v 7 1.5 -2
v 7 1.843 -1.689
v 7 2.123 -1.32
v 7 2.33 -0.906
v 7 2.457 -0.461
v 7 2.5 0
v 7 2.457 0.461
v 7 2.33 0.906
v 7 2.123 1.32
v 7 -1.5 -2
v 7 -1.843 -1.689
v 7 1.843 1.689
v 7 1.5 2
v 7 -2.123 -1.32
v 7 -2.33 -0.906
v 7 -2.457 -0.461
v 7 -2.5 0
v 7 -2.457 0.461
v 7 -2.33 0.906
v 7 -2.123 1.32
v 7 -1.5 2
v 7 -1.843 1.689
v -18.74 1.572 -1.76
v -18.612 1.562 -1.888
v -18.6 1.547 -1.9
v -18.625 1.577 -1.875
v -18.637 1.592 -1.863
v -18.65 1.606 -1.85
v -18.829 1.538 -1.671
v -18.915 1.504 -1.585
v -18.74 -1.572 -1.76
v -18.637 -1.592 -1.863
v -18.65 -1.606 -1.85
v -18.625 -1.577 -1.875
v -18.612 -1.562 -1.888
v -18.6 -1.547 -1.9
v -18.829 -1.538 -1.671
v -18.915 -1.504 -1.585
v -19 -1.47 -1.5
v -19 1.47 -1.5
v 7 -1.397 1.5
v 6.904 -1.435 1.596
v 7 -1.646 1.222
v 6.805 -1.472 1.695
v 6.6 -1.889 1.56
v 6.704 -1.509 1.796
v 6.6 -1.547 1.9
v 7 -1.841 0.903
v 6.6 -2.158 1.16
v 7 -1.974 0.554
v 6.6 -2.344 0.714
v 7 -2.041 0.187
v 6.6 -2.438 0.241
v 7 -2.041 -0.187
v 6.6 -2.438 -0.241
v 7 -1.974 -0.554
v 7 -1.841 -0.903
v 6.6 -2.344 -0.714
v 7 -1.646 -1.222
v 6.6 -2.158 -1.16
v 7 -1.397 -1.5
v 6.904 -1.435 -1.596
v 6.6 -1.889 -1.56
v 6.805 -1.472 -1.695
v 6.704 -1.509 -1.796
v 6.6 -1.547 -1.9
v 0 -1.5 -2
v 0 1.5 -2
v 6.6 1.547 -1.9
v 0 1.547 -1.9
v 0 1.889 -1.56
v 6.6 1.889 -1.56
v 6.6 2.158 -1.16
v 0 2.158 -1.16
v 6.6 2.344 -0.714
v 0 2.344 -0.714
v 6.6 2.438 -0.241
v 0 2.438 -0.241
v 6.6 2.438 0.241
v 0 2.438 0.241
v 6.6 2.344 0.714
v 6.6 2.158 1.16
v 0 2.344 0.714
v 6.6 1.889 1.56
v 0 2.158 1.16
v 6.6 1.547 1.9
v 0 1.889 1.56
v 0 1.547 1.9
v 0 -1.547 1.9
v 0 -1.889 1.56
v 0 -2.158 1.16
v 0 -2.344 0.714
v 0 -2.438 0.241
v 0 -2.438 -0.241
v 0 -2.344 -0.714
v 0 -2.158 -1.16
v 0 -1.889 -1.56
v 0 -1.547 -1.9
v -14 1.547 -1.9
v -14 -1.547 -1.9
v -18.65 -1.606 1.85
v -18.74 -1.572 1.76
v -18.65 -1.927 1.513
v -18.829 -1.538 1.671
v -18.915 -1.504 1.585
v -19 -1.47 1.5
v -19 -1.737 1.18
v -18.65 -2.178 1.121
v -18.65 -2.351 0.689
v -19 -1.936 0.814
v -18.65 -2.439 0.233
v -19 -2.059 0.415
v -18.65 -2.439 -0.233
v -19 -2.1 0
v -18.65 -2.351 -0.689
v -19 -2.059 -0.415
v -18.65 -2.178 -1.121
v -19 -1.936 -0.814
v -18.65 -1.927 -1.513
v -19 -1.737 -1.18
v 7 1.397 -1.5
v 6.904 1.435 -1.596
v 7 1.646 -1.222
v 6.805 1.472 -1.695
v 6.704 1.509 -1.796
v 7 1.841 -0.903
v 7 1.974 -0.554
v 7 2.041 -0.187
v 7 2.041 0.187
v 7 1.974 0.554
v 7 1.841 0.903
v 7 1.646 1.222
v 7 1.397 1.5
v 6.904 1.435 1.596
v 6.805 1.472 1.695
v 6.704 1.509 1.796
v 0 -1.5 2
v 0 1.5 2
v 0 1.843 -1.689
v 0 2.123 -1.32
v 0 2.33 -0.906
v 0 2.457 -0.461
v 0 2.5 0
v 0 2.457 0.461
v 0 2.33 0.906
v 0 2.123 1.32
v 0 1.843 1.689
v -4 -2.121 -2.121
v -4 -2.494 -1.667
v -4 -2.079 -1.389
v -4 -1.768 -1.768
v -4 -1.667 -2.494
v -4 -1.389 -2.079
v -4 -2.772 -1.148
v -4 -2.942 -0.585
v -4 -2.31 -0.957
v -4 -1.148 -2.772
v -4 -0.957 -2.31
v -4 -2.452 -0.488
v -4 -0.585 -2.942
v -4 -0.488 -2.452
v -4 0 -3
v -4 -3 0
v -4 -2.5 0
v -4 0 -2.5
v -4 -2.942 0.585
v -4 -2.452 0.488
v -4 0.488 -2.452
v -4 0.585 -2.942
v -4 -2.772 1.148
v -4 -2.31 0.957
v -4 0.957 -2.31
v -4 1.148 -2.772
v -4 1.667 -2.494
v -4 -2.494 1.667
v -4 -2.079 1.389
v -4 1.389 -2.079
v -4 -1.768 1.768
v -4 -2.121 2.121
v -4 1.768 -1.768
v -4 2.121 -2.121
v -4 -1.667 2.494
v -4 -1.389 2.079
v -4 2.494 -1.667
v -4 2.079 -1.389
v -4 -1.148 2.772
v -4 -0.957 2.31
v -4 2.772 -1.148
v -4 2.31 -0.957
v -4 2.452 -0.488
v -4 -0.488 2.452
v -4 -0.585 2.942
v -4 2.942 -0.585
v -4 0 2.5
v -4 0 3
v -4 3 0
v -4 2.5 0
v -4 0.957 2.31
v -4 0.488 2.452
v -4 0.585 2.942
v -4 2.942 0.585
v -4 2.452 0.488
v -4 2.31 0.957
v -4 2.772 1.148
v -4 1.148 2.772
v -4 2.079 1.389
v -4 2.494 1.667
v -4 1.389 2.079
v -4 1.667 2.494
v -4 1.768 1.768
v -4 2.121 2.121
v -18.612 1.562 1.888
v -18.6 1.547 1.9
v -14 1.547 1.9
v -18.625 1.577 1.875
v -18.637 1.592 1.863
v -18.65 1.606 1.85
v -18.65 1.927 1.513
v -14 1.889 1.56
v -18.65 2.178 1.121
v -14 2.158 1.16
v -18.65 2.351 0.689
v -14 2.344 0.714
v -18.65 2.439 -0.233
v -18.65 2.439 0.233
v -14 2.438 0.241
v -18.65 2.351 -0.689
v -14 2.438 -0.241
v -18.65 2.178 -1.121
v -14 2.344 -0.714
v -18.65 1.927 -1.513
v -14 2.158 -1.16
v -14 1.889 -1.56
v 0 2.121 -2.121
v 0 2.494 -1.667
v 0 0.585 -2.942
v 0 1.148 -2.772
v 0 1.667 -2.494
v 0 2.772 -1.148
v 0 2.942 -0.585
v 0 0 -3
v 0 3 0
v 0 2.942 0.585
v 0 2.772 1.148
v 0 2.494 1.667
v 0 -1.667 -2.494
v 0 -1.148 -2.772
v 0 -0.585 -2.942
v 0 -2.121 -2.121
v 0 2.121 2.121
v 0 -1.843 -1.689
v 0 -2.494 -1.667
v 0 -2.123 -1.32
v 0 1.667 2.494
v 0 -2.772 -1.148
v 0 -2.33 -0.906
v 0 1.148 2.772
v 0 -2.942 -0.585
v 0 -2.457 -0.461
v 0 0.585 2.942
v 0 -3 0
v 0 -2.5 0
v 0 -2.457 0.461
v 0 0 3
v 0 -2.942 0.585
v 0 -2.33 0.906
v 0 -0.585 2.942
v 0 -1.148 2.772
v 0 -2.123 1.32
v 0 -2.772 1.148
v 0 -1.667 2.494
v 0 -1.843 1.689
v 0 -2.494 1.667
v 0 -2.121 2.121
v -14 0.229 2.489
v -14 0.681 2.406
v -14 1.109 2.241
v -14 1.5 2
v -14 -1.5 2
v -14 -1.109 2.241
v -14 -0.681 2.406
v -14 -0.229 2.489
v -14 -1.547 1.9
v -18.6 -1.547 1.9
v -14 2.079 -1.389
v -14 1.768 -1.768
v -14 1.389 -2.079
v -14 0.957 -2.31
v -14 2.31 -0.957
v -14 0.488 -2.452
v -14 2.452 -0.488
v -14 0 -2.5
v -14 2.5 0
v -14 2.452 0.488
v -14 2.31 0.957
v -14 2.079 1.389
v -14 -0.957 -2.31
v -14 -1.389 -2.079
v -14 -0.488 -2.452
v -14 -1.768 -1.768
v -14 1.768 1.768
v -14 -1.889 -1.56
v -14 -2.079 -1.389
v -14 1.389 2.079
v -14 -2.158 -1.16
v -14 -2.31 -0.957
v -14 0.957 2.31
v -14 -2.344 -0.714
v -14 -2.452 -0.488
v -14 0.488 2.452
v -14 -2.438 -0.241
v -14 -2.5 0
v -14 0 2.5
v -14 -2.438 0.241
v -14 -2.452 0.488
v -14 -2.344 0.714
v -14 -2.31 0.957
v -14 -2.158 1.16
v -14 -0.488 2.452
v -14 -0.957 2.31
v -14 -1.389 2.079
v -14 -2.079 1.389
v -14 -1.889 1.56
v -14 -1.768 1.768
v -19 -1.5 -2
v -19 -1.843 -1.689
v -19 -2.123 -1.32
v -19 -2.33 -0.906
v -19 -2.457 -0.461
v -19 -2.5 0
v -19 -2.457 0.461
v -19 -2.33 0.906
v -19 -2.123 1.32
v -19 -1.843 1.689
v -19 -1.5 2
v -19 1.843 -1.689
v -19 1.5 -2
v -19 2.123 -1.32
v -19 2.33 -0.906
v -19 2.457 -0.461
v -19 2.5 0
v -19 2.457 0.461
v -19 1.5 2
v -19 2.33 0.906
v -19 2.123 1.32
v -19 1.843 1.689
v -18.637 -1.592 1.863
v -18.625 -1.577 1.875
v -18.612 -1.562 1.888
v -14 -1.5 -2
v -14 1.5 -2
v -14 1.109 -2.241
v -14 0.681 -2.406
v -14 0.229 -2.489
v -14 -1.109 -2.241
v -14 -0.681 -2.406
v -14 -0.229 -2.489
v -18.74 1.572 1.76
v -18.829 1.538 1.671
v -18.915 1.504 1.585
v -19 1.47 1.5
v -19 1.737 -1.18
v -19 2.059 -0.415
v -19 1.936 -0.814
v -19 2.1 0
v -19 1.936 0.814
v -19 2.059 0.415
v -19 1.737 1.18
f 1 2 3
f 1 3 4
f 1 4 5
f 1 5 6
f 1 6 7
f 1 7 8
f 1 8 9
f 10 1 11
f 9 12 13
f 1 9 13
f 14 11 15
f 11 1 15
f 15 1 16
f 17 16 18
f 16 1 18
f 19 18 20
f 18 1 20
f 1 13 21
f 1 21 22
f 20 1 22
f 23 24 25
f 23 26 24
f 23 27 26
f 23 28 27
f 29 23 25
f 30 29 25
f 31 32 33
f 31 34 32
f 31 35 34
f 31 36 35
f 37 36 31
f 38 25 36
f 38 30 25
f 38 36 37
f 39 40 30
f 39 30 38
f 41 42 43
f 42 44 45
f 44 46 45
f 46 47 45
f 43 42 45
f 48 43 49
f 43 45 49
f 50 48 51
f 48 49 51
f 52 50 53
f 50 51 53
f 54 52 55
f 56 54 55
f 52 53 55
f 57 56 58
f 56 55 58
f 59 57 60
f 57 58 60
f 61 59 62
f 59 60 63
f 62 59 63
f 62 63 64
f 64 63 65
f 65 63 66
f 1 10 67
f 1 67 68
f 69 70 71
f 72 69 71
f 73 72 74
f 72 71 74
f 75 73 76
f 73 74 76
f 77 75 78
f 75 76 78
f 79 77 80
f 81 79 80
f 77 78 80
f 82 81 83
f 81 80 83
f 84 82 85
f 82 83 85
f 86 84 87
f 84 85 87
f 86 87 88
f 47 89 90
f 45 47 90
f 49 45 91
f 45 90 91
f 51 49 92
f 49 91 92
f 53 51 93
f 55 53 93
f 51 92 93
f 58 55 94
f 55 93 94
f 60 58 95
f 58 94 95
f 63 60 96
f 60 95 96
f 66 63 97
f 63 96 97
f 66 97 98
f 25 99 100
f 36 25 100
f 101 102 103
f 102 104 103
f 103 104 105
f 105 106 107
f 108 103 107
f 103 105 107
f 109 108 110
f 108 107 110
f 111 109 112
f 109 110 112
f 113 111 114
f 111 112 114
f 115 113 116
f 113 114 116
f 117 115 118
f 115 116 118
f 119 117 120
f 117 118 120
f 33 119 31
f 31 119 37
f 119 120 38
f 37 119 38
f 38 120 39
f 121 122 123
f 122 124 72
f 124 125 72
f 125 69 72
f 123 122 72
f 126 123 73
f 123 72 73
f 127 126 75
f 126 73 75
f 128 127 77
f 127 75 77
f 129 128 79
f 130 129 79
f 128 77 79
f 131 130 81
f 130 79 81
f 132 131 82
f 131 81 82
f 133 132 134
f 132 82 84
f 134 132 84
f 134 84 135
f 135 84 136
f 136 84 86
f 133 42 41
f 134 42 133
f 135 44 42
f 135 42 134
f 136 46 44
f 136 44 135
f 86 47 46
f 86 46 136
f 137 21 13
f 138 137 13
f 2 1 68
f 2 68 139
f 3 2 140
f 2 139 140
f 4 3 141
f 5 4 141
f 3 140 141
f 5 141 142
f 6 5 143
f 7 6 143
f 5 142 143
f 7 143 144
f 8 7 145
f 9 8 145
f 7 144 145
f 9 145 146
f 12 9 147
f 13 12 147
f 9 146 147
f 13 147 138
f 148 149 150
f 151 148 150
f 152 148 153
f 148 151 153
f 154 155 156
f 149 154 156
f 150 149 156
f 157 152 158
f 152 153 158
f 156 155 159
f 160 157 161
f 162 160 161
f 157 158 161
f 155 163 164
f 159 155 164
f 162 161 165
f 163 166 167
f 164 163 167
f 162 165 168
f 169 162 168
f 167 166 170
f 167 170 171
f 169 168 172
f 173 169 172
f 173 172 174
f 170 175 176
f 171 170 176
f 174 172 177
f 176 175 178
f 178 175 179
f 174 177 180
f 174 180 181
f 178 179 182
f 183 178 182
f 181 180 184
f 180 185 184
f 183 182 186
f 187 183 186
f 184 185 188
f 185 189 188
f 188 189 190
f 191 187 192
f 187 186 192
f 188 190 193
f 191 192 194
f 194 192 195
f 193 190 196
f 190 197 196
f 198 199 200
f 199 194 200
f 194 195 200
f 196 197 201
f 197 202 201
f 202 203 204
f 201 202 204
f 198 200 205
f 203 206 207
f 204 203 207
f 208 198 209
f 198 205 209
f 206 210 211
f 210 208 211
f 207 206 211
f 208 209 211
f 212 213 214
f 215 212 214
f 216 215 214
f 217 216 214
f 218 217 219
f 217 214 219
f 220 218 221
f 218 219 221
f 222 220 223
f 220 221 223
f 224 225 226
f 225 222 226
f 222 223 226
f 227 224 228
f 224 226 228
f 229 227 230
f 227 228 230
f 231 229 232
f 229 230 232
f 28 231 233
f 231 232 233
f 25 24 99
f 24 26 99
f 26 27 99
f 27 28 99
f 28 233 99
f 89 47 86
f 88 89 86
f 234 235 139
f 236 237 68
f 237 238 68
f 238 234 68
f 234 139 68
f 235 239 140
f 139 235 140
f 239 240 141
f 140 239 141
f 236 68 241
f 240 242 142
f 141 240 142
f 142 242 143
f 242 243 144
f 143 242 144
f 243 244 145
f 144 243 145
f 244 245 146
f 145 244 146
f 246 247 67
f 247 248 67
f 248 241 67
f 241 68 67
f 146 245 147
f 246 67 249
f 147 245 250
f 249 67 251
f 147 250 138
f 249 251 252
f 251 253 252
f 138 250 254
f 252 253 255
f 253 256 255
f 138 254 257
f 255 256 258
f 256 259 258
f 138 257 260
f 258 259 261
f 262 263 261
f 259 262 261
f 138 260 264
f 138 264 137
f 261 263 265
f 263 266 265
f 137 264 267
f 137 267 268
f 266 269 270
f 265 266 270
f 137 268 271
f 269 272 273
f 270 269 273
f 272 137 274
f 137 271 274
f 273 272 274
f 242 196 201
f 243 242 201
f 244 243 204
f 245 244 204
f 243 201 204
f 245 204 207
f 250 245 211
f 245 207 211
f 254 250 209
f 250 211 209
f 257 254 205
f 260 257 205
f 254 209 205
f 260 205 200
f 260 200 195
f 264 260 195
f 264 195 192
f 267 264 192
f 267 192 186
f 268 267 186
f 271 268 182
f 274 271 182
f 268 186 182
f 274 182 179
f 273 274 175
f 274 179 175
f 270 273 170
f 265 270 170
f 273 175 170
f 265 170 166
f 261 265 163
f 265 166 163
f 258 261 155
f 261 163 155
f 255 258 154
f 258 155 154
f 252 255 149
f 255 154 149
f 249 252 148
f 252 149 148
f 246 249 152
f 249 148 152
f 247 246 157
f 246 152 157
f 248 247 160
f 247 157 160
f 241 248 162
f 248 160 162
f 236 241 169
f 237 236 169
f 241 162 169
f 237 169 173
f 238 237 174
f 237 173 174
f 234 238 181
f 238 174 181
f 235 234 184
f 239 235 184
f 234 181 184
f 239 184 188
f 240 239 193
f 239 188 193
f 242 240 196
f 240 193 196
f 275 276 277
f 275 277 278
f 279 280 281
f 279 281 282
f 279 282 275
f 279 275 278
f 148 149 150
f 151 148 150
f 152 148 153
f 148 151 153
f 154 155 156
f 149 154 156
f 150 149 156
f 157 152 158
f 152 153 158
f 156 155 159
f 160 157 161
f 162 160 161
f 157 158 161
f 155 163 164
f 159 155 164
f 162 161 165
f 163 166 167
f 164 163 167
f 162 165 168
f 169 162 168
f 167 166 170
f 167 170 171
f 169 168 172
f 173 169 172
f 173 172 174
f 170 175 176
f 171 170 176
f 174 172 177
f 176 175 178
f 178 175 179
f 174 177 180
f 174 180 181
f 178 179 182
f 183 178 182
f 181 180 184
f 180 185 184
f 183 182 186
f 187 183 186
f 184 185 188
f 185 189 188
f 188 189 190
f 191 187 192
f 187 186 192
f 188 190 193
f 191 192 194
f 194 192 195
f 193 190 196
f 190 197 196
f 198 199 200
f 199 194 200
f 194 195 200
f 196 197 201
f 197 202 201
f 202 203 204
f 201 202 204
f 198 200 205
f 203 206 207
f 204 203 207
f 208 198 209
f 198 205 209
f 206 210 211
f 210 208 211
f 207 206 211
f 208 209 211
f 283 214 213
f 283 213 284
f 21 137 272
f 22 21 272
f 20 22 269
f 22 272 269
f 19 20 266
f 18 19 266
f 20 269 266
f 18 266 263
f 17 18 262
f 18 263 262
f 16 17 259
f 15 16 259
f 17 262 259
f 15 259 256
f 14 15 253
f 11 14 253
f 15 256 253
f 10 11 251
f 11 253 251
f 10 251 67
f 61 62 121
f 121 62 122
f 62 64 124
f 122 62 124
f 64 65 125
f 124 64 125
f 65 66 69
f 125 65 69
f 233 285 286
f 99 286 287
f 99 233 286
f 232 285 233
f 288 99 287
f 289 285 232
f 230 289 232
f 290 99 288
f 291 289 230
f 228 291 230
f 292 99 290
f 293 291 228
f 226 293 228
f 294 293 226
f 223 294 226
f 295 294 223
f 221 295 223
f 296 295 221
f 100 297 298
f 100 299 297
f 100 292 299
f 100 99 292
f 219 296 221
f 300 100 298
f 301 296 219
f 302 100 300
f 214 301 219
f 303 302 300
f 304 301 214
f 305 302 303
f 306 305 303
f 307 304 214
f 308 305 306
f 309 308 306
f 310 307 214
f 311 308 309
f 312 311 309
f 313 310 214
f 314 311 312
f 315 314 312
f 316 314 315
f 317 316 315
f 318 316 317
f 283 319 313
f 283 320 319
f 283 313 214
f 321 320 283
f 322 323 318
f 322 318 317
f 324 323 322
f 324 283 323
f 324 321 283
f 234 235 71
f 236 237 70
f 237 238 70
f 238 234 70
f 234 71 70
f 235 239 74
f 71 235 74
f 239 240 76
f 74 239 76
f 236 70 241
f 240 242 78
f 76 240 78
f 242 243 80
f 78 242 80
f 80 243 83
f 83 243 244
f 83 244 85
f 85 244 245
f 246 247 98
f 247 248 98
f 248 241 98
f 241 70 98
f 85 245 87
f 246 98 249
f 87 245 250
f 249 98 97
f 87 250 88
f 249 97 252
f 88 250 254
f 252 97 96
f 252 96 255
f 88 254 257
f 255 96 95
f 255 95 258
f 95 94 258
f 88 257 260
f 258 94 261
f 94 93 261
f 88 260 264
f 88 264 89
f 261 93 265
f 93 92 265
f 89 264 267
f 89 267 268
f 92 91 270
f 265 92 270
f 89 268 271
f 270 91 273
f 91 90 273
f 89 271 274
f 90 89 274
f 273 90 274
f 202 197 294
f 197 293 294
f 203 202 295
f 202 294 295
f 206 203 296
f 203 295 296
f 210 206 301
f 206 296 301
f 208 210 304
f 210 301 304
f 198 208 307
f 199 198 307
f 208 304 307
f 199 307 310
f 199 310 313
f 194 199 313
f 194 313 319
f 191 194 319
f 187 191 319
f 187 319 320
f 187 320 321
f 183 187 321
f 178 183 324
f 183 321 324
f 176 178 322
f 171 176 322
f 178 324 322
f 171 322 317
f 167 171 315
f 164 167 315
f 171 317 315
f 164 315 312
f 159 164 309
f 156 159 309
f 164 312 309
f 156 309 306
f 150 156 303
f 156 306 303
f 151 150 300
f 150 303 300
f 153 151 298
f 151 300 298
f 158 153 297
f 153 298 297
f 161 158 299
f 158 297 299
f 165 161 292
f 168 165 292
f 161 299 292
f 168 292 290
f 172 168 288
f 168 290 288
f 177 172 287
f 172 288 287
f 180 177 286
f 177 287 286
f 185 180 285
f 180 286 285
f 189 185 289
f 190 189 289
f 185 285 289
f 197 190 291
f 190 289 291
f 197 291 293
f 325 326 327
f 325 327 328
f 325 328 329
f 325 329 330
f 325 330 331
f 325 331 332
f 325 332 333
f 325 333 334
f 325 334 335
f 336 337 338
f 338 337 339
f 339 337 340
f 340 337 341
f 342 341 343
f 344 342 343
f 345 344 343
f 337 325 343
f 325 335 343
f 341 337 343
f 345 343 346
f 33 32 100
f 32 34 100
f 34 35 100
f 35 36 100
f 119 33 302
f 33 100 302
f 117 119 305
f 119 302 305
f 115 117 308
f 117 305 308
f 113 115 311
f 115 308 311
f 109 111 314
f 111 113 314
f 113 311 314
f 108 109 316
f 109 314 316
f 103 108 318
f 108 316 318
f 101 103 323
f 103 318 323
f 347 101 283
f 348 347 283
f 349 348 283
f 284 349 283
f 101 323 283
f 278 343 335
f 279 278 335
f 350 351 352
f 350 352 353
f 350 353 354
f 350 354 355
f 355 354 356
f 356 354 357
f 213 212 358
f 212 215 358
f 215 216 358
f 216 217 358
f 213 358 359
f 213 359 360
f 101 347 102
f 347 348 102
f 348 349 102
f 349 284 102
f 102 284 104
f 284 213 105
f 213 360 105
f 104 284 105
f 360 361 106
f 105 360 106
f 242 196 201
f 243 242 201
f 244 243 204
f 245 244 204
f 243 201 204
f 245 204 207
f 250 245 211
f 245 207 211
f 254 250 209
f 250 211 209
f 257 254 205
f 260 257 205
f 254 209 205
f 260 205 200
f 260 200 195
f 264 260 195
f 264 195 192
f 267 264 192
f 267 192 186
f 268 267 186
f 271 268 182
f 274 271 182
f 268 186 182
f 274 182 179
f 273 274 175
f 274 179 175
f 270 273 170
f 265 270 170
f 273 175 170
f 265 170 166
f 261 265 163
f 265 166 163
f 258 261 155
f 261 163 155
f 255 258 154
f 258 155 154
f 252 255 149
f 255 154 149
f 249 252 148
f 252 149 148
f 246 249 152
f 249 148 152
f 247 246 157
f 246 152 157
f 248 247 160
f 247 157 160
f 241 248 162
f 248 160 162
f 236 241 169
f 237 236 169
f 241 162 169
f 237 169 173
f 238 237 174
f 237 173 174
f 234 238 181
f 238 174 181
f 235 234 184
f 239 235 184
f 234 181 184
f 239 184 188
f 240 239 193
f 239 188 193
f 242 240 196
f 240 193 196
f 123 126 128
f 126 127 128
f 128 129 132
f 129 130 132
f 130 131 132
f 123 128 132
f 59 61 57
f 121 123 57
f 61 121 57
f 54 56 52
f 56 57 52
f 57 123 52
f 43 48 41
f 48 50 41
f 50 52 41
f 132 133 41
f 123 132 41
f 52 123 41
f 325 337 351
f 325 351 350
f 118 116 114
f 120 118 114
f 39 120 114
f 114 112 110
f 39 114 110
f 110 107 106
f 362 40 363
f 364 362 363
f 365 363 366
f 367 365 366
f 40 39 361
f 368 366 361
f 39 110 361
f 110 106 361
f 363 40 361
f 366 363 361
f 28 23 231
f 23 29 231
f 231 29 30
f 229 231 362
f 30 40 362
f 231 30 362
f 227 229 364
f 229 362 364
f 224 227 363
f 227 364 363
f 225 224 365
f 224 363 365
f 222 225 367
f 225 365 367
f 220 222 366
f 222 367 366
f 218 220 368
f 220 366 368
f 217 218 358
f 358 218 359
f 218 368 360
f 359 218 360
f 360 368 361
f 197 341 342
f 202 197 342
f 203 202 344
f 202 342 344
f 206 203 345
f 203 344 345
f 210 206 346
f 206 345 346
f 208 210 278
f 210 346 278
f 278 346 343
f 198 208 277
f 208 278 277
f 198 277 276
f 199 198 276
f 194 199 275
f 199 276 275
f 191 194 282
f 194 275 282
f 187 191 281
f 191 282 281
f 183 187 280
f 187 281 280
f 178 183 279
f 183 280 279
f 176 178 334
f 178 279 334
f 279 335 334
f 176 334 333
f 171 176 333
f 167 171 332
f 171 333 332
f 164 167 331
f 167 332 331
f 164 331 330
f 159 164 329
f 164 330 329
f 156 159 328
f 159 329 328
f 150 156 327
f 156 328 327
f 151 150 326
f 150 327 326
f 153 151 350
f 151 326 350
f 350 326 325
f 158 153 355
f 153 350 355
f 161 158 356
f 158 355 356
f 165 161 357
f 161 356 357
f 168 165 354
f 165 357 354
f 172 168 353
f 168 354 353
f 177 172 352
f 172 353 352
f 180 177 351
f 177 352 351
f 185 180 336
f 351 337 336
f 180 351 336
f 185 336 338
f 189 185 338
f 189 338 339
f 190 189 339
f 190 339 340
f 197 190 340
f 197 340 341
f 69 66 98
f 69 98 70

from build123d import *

# Parameters (mm, degrees)
SKETCH001_W     = 10
SKETCH001_H     = 5
POCKET_DEPTH    = 5
SKETCH002_W     = 10
SKETCH002_H     = 5
POCKET001_DEPTH = 7
SKETCH004_W     = 10
SKETCH004_H     = 5
POCKET002_DEPTH = 5
SKETCH005_W     = 10
SKETCH005_H     = 5
POCKET003_DEPTH = 7
CHAMFER_SIZE    = 0.4
SKETCH006_R     = 3
SKETCH006_R_2   = 2.45
POCKET004_DEPTH = 5.001


with BuildPart() as shaft1_skel:
    # Sketch → Revolution (revolve)
    with BuildSketch(Plane.XY):
        Polygon((7, 0), (7, 2.5), (0, 2.5), (0, 3), (-4, 3), (-4, 2.5), (-19, 2.5), (-19, 0), align=None)
    revolve(axis=Axis((0, 0, 0), (1, 0, 0)))

    # Sketch001 (on Face7 of Revolution) → Pocket (cut)
    with BuildSketch(Plane(origin=(-19, 0, 0), x_dir=(0, -1, 0), z_dir=(-1, 0, 0))):
        with Locations((0, 4.5)):
            Rectangle(SKETCH001_W, SKETCH001_H)
        with Locations((0, -4.5)):
            Rectangle(SKETCH001_W, SKETCH001_H)
    extrude(amount=-POCKET_DEPTH, mode=Mode.SUBTRACT)

    # Sketch002 (on Face1 of Pocket) → Pocket001 (cut)
    with BuildSketch(Plane.YZ.offset(7)):
        with Locations((0, 4.5)):
            Rectangle(SKETCH002_W, SKETCH002_H)
        with Locations((0, -4.5)):
            Rectangle(SKETCH002_W, SKETCH002_H)
    extrude(amount=-POCKET001_DEPTH, mode=Mode.SUBTRACT)


with BuildPart() as shaft1s:
    # Sketch003 → Revolution001 (revolve)
    with BuildSketch(Plane.XY):
        Polygon((7, 0), (7, 2.45), (0, 2.45), (0, 3), (-4, 3), (-4, 2.5), (-19, 2.5), (-19, 0), align=None)
    revolve(axis=Axis((0, 0, 0), (1, 0, 0)))

    # Sketch004 (on Face7 of Revolution001) → Pocket002 (cut)
    with BuildSketch(Plane(origin=(-19, 0, 0), x_dir=(0, -1, 0), z_dir=(-1, 0, 0))):
        with Locations((0, 4.4)):
            Rectangle(SKETCH004_W, SKETCH004_H)
        with Locations((0, -4.4)):
            Rectangle(SKETCH004_W, SKETCH004_H)
    extrude(amount=-POCKET002_DEPTH, mode=Mode.SUBTRACT)

    # Sketch005 (on Face1 of Pocket002) → Pocket003 (cut)
    with BuildSketch(Plane.YZ.offset(7)):
        with Locations((0, 4.4)):
            Rectangle(SKETCH005_W, SKETCH005_H)
        with Locations((0, -4.4)):
            Rectangle(SKETCH005_W, SKETCH005_H)
    extrude(amount=-POCKET003_DEPTH, mode=Mode.SUBTRACT)

    # Chamfer
    chamfer_edges = [shaft1s.edges().sort_by_distance(p)[0] for p in [
        (7, -2.45, 0),
        (7, 2.212701, 1.051882),
        (7, 2.212701, -1.051882),
        (7, 0, 1.9),
        (7, 0, -1.9),
        (-19, 0, -1.9),
        (-19, 2.270685, -1.04594),
        (-19, 2.270685, 1.04594),
        (-19, -2.5, 0),
        (-19, 0, 1.9),
    ]]
    chamfer(chamfer_edges, length=CHAMFER_SIZE)

    # Sketch006 (on DatumPlane) → Pocket004 (cut, through all)
    with BuildSketch(Plane(origin=(-14, 0, 0), x_dir=(0, -1, 0), z_dir=(-1, 0, 0))):
        Circle(SKETCH006_R)
        Circle(SKETCH006_R_2, mode=Mode.SUBTRACT)
    extrude(amount=POCKET004_DEPTH, mode=Mode.SUBTRACT)


solid = Compound([shaft1_skel.part, shaft1s.part])
